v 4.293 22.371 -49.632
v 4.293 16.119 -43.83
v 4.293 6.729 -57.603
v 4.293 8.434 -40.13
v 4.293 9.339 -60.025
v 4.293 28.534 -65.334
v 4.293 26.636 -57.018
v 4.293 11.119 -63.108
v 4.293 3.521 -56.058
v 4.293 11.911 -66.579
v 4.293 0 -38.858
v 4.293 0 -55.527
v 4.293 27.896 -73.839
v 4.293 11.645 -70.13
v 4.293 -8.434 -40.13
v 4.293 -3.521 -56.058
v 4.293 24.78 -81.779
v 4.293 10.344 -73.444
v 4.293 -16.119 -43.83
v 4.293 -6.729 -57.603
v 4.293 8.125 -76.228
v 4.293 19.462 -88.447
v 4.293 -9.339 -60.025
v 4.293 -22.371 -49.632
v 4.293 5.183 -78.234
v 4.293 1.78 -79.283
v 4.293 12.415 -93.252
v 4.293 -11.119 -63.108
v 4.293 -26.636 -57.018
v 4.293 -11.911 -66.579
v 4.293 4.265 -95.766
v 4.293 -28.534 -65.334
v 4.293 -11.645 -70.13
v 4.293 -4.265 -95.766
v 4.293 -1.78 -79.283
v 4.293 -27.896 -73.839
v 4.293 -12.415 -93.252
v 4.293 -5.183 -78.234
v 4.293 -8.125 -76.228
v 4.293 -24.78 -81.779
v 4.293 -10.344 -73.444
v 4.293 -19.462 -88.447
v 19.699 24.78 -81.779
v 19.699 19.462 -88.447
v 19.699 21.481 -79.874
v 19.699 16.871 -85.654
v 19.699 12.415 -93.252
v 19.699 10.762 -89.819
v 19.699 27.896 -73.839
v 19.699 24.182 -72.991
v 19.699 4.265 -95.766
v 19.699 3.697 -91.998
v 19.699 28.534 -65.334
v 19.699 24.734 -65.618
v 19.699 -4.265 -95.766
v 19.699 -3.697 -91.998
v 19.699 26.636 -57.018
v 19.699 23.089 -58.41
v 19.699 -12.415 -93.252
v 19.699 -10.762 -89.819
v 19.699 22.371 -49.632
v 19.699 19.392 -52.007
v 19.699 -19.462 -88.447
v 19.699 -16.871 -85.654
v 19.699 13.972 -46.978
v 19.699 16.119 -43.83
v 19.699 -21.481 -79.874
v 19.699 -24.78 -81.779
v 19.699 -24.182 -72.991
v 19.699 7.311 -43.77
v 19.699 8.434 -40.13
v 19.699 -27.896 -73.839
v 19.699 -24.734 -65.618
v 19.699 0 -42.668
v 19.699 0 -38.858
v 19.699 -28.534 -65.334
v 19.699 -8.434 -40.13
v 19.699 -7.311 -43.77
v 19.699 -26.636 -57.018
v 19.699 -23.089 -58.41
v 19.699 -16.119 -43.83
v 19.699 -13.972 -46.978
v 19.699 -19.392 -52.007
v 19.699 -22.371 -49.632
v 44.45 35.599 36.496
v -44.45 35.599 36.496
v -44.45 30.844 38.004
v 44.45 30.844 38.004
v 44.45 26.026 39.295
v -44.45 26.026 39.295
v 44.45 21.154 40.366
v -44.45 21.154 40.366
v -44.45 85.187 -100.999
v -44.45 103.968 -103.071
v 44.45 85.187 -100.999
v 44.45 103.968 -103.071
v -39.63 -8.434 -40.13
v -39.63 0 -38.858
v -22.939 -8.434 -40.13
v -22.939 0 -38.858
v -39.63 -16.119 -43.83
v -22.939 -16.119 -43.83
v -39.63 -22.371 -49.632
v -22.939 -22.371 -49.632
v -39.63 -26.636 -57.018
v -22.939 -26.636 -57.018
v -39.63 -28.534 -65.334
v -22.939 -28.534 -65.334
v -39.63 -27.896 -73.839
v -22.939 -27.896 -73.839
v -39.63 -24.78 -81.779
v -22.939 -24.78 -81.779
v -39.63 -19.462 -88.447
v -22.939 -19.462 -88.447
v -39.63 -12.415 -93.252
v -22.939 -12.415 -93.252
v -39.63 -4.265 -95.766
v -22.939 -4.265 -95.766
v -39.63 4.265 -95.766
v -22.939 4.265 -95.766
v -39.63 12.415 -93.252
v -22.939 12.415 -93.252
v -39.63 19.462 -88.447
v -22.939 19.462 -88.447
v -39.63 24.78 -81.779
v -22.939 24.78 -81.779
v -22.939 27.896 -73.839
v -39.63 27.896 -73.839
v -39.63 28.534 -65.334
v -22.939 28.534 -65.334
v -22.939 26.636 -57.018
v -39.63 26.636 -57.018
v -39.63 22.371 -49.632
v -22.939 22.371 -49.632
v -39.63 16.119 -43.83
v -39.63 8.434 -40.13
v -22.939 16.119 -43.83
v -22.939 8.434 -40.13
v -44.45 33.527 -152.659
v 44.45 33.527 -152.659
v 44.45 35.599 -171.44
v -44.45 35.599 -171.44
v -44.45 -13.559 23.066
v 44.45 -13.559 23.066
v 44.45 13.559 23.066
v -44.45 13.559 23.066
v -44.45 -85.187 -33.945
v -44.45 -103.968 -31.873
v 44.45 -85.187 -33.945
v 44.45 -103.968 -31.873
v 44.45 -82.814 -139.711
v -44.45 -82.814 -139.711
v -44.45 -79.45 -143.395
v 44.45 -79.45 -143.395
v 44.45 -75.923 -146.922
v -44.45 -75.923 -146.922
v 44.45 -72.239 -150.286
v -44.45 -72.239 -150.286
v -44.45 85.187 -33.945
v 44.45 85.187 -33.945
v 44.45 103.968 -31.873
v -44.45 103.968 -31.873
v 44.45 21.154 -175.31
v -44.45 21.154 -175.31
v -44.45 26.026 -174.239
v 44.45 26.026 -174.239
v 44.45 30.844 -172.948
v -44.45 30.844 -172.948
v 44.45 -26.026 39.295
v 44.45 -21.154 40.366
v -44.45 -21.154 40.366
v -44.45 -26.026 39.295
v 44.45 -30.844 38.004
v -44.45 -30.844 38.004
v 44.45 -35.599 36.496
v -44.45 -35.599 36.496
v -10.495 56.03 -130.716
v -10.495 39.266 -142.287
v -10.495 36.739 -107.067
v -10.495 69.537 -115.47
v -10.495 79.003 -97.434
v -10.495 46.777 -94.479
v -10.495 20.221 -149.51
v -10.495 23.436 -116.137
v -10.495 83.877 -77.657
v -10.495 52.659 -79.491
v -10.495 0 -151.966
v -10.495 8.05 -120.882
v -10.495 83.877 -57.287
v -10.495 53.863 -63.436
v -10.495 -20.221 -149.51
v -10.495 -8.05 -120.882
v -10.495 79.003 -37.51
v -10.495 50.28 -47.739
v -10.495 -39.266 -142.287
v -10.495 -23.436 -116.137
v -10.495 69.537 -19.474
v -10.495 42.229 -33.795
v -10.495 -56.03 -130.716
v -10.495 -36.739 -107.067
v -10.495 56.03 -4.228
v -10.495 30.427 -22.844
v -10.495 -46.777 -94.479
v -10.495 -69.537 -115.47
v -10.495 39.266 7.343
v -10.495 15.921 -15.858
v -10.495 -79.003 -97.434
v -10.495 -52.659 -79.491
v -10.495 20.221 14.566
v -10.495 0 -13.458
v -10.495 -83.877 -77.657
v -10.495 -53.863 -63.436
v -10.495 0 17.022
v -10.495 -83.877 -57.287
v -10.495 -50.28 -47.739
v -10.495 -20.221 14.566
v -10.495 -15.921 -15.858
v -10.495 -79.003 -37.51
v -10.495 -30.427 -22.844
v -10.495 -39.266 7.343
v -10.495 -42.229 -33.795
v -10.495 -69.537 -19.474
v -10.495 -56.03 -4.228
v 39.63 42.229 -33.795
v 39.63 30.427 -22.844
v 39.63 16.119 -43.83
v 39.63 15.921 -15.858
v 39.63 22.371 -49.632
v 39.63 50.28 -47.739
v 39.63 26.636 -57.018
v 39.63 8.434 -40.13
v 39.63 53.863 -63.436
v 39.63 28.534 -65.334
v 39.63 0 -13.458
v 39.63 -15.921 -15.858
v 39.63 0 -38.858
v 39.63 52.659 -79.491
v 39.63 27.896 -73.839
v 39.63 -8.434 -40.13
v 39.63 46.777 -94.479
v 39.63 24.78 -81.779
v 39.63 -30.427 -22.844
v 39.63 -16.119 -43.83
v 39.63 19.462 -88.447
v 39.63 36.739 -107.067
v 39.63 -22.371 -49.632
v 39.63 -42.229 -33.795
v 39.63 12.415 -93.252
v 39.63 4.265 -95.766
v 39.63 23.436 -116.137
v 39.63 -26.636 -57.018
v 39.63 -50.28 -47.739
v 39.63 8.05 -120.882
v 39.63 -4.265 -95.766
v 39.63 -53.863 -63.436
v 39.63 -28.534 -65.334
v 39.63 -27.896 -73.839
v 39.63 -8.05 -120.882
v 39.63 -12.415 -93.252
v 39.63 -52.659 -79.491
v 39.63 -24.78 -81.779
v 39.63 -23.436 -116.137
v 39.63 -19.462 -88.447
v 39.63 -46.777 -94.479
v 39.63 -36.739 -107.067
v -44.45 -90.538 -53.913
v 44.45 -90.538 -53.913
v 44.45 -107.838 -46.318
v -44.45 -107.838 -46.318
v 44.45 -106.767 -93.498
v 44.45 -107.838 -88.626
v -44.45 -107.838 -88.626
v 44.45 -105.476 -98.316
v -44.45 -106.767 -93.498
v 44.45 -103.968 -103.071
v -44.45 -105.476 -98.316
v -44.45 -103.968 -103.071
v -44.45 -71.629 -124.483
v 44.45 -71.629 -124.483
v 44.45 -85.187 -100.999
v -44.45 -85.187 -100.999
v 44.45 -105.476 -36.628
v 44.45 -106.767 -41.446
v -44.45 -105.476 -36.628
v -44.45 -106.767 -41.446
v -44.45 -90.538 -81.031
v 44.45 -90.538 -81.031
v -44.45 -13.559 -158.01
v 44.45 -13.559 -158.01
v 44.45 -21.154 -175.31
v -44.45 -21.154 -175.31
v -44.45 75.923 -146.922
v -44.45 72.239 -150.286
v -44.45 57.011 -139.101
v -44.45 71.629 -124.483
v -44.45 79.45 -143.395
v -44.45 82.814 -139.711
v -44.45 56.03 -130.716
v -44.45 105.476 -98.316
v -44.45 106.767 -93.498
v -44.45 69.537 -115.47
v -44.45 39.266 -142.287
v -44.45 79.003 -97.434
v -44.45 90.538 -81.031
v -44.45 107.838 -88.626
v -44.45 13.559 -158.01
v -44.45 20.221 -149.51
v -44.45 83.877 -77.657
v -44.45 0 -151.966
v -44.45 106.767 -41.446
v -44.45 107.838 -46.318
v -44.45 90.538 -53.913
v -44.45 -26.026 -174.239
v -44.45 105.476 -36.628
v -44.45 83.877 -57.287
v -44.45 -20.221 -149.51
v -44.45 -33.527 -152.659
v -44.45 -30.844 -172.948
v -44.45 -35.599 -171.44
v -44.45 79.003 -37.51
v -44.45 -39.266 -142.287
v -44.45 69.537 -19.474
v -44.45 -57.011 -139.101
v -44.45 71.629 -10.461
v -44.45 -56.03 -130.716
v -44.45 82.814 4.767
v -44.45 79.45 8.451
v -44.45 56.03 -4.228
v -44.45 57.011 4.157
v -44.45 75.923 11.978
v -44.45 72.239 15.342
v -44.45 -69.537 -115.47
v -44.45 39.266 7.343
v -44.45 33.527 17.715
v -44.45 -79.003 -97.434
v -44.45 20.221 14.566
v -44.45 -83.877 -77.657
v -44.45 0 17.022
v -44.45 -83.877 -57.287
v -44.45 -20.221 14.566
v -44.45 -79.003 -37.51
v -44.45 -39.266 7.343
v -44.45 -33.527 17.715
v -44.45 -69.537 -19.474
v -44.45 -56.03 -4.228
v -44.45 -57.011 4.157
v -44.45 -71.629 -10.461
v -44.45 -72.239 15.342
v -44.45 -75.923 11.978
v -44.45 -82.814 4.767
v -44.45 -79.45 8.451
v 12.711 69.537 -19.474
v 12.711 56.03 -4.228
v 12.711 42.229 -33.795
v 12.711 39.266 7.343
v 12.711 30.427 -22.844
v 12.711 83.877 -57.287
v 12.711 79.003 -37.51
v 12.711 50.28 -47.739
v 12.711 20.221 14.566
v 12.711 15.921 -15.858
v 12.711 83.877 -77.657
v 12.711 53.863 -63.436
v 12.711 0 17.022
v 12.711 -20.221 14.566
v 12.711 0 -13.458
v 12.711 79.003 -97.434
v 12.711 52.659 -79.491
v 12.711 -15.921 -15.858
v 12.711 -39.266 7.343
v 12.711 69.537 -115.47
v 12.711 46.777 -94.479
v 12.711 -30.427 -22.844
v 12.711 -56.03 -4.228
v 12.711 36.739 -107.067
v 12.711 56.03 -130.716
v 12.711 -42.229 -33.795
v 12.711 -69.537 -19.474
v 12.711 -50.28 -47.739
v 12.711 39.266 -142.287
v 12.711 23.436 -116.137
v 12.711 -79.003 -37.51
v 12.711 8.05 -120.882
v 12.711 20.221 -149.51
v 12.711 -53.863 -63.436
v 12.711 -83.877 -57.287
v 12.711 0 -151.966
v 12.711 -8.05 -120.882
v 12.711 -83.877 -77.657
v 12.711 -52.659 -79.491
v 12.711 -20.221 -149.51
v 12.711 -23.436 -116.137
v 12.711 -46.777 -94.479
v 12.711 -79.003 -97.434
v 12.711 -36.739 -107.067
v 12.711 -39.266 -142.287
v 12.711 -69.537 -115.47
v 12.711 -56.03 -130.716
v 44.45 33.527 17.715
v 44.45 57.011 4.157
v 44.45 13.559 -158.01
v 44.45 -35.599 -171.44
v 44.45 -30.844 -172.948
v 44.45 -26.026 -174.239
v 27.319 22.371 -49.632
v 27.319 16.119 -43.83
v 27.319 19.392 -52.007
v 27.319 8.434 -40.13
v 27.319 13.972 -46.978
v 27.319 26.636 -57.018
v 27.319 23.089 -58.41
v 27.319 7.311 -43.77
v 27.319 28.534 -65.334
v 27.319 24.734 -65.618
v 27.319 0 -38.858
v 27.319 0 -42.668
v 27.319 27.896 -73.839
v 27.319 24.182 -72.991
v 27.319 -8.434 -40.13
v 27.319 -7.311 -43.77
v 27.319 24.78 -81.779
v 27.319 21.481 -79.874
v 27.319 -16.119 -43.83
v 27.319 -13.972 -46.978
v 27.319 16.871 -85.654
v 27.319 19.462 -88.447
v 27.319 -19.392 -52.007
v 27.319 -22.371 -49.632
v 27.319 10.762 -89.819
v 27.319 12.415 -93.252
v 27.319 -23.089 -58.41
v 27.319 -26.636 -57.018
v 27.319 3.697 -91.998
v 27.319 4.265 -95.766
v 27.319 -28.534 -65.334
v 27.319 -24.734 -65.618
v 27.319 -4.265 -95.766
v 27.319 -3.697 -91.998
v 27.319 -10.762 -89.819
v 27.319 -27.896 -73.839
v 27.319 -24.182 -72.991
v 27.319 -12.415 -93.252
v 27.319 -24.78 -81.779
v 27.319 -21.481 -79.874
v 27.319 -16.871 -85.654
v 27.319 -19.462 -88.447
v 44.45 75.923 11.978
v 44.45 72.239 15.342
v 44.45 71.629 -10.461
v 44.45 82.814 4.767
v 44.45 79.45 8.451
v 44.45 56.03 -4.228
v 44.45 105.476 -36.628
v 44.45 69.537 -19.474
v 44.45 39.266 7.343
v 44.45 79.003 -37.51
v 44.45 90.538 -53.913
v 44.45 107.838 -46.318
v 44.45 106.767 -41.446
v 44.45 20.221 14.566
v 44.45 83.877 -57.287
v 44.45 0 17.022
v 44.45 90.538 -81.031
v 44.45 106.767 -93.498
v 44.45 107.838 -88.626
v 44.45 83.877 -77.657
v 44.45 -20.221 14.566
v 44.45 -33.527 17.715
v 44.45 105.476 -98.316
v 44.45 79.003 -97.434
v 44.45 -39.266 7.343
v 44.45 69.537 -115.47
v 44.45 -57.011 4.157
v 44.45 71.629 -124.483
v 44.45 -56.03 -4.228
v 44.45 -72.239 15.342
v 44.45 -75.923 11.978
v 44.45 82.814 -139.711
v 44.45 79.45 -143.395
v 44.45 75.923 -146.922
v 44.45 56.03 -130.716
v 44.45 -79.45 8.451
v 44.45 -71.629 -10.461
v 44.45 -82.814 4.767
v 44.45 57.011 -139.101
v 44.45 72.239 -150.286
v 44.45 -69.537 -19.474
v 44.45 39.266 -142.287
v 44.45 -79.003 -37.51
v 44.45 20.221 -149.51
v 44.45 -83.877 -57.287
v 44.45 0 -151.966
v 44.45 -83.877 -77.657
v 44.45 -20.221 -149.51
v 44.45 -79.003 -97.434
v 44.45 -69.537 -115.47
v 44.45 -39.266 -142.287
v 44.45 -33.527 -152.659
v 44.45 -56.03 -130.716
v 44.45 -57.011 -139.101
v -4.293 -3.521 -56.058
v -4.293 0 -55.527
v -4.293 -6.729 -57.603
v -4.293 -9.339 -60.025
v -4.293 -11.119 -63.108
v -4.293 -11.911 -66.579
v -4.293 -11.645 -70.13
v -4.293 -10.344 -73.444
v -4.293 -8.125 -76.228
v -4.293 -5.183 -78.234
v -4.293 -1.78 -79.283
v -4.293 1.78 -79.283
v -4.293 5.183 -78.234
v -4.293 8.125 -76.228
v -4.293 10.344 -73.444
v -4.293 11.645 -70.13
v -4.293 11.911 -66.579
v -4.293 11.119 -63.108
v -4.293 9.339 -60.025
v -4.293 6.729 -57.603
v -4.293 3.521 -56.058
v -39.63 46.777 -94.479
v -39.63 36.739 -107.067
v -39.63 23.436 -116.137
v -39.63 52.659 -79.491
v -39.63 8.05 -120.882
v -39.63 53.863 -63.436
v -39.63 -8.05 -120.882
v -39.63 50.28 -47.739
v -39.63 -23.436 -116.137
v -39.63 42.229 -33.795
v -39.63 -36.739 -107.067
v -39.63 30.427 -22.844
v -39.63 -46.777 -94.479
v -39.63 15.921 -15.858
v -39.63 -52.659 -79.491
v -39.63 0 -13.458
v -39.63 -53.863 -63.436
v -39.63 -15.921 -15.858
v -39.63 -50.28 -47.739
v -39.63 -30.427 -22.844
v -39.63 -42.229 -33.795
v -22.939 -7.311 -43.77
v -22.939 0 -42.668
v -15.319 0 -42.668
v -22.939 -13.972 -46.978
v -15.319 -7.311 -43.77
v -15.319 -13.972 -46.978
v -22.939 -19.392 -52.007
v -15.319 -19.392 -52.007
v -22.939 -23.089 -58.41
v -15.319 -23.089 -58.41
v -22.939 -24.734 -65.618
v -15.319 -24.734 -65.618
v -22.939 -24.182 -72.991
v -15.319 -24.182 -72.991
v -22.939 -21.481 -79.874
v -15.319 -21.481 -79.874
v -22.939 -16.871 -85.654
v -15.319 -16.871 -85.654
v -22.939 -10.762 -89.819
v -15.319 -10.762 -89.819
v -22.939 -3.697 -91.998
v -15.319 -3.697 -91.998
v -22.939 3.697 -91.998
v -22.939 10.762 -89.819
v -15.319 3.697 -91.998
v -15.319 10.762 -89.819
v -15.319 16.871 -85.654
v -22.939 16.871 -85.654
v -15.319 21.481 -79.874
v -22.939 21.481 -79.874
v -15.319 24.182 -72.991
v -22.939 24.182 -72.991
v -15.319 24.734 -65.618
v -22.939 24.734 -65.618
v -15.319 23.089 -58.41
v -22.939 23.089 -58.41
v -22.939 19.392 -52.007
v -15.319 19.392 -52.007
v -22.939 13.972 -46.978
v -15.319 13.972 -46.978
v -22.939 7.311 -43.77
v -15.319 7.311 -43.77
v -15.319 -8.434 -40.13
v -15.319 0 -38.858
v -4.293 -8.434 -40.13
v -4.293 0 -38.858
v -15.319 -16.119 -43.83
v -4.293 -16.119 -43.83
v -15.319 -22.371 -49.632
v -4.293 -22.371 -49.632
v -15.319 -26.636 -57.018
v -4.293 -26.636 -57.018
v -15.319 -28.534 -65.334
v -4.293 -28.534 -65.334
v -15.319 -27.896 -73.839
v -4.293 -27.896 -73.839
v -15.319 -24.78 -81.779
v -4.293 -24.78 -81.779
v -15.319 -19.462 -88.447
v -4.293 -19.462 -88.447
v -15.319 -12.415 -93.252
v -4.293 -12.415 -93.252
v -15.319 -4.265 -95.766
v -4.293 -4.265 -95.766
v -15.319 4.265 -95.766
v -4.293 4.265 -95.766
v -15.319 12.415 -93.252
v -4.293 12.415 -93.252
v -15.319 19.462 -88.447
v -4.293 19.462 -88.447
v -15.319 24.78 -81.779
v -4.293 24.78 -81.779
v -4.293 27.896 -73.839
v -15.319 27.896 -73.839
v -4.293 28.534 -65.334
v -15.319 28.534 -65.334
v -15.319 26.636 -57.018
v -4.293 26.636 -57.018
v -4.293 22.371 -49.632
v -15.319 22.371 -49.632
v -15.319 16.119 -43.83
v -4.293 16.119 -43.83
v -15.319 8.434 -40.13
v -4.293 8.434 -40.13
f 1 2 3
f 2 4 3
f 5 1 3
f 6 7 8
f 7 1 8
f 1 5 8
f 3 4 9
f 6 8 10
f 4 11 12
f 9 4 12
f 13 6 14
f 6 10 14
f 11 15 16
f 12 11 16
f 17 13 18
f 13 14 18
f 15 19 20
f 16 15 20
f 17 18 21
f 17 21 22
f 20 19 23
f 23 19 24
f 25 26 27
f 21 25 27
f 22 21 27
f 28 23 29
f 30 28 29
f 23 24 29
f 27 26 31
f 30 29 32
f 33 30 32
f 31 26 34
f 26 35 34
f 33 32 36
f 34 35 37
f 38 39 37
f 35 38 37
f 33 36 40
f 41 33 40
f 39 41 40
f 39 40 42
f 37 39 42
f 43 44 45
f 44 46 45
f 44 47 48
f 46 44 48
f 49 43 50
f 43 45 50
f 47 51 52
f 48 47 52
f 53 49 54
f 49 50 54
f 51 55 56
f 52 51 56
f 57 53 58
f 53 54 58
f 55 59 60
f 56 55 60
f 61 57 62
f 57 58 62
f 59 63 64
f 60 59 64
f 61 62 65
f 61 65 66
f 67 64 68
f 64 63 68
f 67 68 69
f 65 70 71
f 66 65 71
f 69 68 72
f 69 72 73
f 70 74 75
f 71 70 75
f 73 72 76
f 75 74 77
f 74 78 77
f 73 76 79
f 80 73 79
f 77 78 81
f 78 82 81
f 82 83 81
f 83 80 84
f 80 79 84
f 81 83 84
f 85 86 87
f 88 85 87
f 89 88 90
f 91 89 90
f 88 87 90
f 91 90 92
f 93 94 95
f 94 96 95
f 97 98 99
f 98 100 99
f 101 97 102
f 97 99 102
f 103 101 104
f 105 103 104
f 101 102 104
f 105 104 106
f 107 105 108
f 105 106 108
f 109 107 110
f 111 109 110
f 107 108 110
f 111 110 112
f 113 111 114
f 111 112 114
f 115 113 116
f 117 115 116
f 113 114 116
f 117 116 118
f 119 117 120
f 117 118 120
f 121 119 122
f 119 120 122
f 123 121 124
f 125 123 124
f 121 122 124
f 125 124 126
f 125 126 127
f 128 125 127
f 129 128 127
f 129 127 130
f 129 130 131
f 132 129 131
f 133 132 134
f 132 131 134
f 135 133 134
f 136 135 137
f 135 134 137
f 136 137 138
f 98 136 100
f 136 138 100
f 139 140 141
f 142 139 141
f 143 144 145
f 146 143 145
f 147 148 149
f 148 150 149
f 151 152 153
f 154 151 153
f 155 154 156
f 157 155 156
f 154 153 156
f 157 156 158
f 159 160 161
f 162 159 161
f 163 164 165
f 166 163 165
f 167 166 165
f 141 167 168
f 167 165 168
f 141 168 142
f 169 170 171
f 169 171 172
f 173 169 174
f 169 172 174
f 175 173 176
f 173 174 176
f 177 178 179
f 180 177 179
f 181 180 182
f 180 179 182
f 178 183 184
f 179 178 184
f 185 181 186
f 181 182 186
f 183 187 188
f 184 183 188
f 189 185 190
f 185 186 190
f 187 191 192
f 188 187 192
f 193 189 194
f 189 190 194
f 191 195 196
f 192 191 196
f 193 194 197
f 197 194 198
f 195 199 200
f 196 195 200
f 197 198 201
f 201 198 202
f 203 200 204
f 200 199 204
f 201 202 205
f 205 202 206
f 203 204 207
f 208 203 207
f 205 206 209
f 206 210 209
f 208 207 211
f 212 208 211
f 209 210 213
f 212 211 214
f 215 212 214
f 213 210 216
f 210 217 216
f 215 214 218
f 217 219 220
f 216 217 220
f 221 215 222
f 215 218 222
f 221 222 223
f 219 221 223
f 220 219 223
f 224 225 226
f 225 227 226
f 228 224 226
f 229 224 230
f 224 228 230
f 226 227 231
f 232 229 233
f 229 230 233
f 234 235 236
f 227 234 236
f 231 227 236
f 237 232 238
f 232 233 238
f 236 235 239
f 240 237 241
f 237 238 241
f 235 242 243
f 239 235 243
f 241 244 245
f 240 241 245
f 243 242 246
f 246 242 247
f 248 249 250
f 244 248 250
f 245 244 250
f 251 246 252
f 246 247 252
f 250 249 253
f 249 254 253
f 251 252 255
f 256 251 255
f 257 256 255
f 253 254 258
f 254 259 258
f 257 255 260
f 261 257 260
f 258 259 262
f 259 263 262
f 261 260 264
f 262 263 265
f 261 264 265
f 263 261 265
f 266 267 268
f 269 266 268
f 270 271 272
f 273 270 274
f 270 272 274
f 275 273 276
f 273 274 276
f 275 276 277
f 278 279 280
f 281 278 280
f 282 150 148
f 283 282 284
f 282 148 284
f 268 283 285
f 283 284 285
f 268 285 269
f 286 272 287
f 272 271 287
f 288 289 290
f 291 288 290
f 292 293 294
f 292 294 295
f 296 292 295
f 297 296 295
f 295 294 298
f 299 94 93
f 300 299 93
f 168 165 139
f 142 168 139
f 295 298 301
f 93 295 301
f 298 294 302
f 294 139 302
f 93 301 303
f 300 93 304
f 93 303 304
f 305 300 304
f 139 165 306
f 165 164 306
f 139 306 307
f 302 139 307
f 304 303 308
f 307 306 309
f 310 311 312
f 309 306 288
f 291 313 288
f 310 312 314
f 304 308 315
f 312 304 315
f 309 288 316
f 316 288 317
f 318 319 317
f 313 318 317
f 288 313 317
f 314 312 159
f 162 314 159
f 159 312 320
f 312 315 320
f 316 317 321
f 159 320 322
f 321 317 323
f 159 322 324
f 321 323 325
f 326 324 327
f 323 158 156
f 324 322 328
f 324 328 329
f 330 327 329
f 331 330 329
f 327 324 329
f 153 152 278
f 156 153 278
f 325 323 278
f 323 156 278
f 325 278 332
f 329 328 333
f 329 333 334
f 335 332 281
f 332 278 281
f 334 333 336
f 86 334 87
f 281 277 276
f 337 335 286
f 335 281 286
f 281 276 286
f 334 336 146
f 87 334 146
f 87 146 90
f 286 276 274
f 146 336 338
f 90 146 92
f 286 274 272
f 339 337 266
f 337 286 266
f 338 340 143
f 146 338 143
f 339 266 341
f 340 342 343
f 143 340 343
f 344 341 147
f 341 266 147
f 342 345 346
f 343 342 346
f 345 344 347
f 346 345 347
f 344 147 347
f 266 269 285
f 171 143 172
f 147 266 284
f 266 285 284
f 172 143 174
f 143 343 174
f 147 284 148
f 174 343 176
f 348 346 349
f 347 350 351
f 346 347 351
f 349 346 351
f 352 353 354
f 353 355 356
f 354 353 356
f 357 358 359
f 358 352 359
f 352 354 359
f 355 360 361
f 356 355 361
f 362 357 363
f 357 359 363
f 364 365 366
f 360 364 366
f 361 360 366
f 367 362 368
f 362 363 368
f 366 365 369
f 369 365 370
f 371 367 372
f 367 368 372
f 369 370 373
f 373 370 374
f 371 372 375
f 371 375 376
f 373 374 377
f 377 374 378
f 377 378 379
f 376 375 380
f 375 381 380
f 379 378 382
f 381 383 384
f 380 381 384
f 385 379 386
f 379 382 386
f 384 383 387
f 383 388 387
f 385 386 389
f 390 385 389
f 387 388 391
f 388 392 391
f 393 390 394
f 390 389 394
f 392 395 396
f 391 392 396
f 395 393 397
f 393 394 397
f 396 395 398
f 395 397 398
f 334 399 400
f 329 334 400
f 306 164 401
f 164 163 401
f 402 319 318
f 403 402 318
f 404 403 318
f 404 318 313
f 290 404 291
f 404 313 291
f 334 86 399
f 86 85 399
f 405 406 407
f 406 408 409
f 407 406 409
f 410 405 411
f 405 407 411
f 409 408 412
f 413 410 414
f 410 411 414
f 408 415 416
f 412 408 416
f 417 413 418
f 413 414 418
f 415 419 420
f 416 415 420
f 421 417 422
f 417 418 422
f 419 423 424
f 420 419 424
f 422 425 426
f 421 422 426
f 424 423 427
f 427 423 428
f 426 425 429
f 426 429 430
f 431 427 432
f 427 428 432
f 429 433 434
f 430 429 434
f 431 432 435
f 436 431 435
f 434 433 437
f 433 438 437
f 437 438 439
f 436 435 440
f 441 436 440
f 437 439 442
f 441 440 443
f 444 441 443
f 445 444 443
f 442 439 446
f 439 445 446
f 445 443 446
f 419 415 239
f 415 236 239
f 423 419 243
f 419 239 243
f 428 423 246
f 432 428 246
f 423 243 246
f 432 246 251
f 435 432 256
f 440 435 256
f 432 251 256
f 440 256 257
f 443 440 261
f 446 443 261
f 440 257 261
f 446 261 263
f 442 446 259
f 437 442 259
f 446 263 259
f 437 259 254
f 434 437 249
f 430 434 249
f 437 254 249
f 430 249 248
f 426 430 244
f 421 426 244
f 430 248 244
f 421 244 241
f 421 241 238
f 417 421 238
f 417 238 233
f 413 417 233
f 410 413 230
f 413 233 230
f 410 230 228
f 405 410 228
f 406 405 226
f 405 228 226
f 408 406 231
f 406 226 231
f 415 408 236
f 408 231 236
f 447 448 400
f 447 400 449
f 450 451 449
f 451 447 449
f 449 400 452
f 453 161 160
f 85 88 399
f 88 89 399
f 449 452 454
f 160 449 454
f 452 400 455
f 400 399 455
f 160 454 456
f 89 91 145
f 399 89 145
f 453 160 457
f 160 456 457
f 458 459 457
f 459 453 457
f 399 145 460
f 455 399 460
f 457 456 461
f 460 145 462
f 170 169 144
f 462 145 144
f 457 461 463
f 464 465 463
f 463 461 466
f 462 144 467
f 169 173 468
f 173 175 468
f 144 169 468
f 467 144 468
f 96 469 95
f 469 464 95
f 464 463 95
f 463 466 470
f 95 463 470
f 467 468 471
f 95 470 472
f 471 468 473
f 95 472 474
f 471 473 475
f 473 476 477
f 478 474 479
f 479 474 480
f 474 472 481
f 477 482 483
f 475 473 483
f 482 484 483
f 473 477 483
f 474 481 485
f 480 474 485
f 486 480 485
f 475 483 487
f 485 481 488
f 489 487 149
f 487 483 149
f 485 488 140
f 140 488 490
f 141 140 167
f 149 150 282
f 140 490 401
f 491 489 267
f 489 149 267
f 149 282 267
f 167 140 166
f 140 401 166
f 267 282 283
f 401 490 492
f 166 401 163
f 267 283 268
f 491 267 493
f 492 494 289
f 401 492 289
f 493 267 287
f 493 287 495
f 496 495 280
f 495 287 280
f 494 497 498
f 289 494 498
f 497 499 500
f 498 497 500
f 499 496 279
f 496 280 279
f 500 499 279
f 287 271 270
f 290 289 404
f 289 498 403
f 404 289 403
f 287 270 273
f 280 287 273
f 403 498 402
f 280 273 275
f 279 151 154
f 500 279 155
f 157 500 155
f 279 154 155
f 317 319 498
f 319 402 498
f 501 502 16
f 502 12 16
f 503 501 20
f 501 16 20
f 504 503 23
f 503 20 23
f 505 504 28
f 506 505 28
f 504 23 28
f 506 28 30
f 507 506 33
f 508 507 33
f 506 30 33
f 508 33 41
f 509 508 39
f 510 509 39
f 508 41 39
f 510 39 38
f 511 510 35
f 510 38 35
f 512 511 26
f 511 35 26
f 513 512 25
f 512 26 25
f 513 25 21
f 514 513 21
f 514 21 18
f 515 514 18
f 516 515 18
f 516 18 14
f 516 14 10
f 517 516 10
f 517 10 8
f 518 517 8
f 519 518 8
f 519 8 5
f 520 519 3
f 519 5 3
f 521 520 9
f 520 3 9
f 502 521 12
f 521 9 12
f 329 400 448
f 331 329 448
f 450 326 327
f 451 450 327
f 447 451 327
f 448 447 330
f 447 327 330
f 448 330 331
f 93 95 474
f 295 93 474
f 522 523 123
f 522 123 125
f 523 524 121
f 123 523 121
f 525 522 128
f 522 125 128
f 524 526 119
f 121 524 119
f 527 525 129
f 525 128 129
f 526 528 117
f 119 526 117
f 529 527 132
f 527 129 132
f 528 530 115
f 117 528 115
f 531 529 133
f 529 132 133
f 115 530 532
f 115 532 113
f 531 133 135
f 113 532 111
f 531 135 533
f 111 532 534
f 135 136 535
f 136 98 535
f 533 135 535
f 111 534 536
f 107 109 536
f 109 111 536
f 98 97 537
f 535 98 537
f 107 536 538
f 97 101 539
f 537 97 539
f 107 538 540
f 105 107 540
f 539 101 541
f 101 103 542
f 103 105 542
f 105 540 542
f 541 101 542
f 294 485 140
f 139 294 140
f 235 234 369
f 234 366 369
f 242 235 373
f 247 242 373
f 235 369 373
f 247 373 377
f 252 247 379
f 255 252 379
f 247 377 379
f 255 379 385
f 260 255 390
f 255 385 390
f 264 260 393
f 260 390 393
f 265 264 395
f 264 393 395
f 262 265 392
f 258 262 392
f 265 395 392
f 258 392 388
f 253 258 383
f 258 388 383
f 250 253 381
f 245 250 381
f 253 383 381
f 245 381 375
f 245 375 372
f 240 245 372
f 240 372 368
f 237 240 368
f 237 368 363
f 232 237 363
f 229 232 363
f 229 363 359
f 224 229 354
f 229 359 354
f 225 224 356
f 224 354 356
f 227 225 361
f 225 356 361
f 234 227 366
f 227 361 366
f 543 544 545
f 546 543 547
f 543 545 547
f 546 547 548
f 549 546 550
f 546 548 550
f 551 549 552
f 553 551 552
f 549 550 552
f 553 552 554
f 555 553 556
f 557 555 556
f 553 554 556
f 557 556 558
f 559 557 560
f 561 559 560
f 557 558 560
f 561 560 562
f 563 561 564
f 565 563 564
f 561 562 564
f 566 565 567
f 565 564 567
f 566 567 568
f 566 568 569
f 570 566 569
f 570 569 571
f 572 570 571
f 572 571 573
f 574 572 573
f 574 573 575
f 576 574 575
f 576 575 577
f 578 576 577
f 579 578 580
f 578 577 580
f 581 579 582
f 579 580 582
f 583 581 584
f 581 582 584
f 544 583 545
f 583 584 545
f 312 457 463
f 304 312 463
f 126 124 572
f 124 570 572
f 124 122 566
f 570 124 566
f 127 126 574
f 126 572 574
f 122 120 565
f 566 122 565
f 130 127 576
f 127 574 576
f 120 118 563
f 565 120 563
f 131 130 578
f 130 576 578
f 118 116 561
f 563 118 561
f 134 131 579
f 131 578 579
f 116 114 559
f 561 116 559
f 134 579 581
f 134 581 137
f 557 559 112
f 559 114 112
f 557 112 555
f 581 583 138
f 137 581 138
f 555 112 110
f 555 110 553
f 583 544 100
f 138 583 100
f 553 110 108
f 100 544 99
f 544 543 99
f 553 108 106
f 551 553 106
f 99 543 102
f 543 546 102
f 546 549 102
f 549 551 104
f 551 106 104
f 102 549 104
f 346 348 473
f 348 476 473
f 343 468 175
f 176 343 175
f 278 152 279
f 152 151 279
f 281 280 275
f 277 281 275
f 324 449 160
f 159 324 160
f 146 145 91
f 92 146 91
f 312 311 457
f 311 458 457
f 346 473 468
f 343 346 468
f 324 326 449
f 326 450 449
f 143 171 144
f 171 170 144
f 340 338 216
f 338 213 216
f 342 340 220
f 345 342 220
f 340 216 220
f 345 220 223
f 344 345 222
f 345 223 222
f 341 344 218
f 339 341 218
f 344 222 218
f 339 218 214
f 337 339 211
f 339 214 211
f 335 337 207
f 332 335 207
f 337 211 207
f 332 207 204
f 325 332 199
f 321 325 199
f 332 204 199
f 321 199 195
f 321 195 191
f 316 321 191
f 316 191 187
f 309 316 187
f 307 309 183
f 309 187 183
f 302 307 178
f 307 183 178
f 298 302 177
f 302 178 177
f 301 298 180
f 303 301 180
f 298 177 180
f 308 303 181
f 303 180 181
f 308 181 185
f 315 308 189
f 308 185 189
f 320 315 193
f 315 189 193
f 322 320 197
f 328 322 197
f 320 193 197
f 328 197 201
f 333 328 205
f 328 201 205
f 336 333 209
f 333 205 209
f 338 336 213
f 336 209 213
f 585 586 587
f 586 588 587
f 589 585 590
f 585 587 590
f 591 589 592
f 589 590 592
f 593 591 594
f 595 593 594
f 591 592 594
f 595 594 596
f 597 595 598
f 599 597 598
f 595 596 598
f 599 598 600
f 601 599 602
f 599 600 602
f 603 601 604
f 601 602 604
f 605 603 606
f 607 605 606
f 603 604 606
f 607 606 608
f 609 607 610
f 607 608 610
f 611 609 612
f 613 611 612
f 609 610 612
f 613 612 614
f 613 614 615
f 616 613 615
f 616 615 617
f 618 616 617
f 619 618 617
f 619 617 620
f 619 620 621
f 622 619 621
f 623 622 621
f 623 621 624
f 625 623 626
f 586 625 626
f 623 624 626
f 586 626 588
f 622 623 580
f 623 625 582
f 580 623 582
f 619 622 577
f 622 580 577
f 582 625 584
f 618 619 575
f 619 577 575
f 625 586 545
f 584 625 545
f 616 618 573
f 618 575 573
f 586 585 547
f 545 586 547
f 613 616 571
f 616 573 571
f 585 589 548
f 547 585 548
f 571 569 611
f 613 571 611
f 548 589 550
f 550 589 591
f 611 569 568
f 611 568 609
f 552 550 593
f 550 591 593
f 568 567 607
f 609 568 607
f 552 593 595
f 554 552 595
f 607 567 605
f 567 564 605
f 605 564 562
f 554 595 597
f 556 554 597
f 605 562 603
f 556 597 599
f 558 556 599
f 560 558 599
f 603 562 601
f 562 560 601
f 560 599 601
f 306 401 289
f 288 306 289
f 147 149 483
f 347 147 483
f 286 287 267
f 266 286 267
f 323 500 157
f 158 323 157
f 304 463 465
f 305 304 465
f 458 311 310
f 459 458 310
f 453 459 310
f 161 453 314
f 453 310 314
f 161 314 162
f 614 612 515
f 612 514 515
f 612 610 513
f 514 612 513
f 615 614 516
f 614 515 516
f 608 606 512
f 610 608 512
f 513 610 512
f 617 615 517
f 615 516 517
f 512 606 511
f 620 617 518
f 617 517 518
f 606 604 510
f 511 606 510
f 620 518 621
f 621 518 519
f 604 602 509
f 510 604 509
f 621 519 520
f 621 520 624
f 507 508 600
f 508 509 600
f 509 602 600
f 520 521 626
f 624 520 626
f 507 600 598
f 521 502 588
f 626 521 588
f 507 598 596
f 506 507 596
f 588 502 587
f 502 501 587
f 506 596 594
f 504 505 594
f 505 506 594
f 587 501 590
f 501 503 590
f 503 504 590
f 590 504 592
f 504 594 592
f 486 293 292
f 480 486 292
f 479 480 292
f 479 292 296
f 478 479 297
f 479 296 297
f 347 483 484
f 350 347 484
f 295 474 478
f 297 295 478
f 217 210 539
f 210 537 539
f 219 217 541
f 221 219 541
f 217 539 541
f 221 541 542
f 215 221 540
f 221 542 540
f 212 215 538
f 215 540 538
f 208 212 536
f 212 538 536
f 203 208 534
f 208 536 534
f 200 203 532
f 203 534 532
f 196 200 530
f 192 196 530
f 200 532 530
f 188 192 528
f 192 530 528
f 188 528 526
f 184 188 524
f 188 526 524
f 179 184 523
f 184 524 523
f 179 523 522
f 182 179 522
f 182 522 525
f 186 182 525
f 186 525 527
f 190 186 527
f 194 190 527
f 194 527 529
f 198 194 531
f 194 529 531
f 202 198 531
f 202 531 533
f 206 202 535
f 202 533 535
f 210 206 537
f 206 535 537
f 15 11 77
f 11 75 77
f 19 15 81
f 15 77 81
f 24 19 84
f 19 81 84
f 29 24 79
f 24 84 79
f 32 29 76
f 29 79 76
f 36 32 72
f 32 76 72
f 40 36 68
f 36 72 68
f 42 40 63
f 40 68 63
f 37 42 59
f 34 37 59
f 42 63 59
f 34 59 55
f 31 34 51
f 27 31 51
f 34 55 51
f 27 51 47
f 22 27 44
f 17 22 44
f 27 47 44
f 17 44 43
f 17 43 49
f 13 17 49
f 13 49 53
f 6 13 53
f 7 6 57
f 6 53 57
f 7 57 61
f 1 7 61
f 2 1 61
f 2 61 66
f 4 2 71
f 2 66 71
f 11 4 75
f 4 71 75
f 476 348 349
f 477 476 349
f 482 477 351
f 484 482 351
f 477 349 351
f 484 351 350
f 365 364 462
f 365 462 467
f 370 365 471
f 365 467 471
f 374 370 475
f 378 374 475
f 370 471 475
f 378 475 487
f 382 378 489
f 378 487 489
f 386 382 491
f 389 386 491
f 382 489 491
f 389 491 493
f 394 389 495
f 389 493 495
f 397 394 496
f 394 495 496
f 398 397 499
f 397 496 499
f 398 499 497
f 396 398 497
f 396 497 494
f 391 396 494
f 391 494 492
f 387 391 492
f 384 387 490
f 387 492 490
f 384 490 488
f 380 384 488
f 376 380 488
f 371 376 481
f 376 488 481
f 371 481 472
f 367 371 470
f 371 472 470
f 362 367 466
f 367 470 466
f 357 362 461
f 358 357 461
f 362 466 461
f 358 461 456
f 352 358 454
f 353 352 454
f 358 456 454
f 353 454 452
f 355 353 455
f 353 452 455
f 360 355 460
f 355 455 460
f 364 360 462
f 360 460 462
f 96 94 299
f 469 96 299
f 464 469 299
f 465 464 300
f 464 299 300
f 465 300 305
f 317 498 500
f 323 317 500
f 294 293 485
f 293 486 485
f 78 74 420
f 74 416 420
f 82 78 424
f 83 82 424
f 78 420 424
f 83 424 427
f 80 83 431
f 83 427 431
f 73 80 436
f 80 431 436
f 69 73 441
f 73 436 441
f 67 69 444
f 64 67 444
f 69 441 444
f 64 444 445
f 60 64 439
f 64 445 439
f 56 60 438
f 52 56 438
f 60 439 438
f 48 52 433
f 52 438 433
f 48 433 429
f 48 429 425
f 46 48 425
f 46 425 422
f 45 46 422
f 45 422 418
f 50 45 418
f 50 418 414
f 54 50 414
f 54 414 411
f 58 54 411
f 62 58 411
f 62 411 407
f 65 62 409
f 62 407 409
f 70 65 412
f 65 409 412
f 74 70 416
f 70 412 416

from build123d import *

# Parameters (mm, degrees)
F3_DEPTH = 45.72
F4_COUNT = 12


with BuildPart() as f1:
    # F0 (on Front) → F1 (revolve)
    with BuildSketch(Plane.XZ):
        Polygon((44.45, 17.0215574244), (44.45, 42.4215574244), (-44.45, 42.4215574244), (-44.45, 17.0215574244), (-10.4945171624, 17.0215574244), (-10.4945171624, -13.4584425756), (-39.6297698409, -13.4584425756), (-39.6297698409, -38.8584425756), (-22.9390684722, -38.8584425756), (-22.9390684722, -42.6684425756), (-15.3190684722, -42.6684425756), (-15.3190684722, -38.8584425756), (-4.2934667461, -38.8584425756), (-4.2934667461, -55.5271957506), (4.2934667461, -55.5271957506), (4.2934667461, -38.8584425756), (19.6994334923, -38.8584425756), (19.6994334923, -42.6684425756), (27.3194334923, -42.6684425756), (27.3194334923, -38.8584425756), (39.6297698409, -38.8584425756), (39.6297698409, -13.4584425756), (12.710894458, -13.4584425756), (12.710894458, 17.0215574244), align=None)
    revolve(axis=Axis((2.7257320471, 0, -67.4719884992), (1, 0, 0)))

    # F2 (on Right) → F3 (cut, symmetric)
    with BuildSketch(Plane.YZ):
        Polygon((-13.5587146506, 23.0656899512), (13.5587146506, 23.0656899512), (24.6522054076, 48.3342073858), (-24.6522054076, 48.3342073858), align=None)
    f3 = extrude(amount=F3_DEPTH, both=True, mode=Mode.SUBTRACT)

    # F4: F3 ×12 about axis
    f4_axis = Axis((44.45, 0, -67.4719884992), (1, 0, 0))
    for i in range(1, F4_COUNT):
        add(f3.rotate(f4_axis, i * 360 / F4_COUNT), mode=Mode.SUBTRACT)


solid = f1.part
